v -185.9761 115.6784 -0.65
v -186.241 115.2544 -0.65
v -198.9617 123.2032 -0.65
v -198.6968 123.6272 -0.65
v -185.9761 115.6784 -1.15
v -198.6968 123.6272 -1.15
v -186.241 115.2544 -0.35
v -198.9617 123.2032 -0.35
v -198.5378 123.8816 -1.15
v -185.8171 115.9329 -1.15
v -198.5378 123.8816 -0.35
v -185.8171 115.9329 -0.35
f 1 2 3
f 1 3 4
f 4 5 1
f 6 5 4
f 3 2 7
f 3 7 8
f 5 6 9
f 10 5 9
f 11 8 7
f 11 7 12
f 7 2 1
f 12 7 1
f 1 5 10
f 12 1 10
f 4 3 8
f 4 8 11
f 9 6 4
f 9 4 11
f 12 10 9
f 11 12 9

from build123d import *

# Parameters (mm, degrees)
BOX123_W               = 0.8
BOX123_H               = 15
BOX123_DEPTH           = 0.8
BOX124_W               = 0.8
BOX124_H               = 15
BOX124_DEPTH           = 0.8
CUT065_PLACEMENT_ANGLE = 58


with BuildPart() as cubo123:
    # Box123 → Box123 (new body)
    with BuildSketch(Plane.XY):
        with Locations((0.4, 7.5)):
            Rectangle(BOX123_W, BOX123_H)
    extrude(amount=BOX123_DEPTH)


with BuildPart() as perfil_l_2da_cara007:
    # Box124 → Box124 (new body)
    with BuildSketch(Plane(origin=(0.3, 0, 0.3), x_dir=(1, 0, 0), z_dir=(0, 0, 1))):
        with Locations((0.4, 7.5)):
            Rectangle(BOX124_W, BOX124_H)
    extrude(amount=BOX124_DEPTH)

    # Cut065: cut Cubo123
    add(cubo123.part, mode=Mode.SUBTRACT)


with BuildPart() as perfil_l_2da_cara007_1:
    # Cut065 placement: moved
    add(perfil_l_2da_cara007.part.moved(Location((-186.4, 115, -1.45))).rotate(Axis((-186.4, 115, -1.45), (0, 0, 1)), CUT065_PLACEMENT_ANGLE))


solid = perfil_l_2da_cara007_1.part
